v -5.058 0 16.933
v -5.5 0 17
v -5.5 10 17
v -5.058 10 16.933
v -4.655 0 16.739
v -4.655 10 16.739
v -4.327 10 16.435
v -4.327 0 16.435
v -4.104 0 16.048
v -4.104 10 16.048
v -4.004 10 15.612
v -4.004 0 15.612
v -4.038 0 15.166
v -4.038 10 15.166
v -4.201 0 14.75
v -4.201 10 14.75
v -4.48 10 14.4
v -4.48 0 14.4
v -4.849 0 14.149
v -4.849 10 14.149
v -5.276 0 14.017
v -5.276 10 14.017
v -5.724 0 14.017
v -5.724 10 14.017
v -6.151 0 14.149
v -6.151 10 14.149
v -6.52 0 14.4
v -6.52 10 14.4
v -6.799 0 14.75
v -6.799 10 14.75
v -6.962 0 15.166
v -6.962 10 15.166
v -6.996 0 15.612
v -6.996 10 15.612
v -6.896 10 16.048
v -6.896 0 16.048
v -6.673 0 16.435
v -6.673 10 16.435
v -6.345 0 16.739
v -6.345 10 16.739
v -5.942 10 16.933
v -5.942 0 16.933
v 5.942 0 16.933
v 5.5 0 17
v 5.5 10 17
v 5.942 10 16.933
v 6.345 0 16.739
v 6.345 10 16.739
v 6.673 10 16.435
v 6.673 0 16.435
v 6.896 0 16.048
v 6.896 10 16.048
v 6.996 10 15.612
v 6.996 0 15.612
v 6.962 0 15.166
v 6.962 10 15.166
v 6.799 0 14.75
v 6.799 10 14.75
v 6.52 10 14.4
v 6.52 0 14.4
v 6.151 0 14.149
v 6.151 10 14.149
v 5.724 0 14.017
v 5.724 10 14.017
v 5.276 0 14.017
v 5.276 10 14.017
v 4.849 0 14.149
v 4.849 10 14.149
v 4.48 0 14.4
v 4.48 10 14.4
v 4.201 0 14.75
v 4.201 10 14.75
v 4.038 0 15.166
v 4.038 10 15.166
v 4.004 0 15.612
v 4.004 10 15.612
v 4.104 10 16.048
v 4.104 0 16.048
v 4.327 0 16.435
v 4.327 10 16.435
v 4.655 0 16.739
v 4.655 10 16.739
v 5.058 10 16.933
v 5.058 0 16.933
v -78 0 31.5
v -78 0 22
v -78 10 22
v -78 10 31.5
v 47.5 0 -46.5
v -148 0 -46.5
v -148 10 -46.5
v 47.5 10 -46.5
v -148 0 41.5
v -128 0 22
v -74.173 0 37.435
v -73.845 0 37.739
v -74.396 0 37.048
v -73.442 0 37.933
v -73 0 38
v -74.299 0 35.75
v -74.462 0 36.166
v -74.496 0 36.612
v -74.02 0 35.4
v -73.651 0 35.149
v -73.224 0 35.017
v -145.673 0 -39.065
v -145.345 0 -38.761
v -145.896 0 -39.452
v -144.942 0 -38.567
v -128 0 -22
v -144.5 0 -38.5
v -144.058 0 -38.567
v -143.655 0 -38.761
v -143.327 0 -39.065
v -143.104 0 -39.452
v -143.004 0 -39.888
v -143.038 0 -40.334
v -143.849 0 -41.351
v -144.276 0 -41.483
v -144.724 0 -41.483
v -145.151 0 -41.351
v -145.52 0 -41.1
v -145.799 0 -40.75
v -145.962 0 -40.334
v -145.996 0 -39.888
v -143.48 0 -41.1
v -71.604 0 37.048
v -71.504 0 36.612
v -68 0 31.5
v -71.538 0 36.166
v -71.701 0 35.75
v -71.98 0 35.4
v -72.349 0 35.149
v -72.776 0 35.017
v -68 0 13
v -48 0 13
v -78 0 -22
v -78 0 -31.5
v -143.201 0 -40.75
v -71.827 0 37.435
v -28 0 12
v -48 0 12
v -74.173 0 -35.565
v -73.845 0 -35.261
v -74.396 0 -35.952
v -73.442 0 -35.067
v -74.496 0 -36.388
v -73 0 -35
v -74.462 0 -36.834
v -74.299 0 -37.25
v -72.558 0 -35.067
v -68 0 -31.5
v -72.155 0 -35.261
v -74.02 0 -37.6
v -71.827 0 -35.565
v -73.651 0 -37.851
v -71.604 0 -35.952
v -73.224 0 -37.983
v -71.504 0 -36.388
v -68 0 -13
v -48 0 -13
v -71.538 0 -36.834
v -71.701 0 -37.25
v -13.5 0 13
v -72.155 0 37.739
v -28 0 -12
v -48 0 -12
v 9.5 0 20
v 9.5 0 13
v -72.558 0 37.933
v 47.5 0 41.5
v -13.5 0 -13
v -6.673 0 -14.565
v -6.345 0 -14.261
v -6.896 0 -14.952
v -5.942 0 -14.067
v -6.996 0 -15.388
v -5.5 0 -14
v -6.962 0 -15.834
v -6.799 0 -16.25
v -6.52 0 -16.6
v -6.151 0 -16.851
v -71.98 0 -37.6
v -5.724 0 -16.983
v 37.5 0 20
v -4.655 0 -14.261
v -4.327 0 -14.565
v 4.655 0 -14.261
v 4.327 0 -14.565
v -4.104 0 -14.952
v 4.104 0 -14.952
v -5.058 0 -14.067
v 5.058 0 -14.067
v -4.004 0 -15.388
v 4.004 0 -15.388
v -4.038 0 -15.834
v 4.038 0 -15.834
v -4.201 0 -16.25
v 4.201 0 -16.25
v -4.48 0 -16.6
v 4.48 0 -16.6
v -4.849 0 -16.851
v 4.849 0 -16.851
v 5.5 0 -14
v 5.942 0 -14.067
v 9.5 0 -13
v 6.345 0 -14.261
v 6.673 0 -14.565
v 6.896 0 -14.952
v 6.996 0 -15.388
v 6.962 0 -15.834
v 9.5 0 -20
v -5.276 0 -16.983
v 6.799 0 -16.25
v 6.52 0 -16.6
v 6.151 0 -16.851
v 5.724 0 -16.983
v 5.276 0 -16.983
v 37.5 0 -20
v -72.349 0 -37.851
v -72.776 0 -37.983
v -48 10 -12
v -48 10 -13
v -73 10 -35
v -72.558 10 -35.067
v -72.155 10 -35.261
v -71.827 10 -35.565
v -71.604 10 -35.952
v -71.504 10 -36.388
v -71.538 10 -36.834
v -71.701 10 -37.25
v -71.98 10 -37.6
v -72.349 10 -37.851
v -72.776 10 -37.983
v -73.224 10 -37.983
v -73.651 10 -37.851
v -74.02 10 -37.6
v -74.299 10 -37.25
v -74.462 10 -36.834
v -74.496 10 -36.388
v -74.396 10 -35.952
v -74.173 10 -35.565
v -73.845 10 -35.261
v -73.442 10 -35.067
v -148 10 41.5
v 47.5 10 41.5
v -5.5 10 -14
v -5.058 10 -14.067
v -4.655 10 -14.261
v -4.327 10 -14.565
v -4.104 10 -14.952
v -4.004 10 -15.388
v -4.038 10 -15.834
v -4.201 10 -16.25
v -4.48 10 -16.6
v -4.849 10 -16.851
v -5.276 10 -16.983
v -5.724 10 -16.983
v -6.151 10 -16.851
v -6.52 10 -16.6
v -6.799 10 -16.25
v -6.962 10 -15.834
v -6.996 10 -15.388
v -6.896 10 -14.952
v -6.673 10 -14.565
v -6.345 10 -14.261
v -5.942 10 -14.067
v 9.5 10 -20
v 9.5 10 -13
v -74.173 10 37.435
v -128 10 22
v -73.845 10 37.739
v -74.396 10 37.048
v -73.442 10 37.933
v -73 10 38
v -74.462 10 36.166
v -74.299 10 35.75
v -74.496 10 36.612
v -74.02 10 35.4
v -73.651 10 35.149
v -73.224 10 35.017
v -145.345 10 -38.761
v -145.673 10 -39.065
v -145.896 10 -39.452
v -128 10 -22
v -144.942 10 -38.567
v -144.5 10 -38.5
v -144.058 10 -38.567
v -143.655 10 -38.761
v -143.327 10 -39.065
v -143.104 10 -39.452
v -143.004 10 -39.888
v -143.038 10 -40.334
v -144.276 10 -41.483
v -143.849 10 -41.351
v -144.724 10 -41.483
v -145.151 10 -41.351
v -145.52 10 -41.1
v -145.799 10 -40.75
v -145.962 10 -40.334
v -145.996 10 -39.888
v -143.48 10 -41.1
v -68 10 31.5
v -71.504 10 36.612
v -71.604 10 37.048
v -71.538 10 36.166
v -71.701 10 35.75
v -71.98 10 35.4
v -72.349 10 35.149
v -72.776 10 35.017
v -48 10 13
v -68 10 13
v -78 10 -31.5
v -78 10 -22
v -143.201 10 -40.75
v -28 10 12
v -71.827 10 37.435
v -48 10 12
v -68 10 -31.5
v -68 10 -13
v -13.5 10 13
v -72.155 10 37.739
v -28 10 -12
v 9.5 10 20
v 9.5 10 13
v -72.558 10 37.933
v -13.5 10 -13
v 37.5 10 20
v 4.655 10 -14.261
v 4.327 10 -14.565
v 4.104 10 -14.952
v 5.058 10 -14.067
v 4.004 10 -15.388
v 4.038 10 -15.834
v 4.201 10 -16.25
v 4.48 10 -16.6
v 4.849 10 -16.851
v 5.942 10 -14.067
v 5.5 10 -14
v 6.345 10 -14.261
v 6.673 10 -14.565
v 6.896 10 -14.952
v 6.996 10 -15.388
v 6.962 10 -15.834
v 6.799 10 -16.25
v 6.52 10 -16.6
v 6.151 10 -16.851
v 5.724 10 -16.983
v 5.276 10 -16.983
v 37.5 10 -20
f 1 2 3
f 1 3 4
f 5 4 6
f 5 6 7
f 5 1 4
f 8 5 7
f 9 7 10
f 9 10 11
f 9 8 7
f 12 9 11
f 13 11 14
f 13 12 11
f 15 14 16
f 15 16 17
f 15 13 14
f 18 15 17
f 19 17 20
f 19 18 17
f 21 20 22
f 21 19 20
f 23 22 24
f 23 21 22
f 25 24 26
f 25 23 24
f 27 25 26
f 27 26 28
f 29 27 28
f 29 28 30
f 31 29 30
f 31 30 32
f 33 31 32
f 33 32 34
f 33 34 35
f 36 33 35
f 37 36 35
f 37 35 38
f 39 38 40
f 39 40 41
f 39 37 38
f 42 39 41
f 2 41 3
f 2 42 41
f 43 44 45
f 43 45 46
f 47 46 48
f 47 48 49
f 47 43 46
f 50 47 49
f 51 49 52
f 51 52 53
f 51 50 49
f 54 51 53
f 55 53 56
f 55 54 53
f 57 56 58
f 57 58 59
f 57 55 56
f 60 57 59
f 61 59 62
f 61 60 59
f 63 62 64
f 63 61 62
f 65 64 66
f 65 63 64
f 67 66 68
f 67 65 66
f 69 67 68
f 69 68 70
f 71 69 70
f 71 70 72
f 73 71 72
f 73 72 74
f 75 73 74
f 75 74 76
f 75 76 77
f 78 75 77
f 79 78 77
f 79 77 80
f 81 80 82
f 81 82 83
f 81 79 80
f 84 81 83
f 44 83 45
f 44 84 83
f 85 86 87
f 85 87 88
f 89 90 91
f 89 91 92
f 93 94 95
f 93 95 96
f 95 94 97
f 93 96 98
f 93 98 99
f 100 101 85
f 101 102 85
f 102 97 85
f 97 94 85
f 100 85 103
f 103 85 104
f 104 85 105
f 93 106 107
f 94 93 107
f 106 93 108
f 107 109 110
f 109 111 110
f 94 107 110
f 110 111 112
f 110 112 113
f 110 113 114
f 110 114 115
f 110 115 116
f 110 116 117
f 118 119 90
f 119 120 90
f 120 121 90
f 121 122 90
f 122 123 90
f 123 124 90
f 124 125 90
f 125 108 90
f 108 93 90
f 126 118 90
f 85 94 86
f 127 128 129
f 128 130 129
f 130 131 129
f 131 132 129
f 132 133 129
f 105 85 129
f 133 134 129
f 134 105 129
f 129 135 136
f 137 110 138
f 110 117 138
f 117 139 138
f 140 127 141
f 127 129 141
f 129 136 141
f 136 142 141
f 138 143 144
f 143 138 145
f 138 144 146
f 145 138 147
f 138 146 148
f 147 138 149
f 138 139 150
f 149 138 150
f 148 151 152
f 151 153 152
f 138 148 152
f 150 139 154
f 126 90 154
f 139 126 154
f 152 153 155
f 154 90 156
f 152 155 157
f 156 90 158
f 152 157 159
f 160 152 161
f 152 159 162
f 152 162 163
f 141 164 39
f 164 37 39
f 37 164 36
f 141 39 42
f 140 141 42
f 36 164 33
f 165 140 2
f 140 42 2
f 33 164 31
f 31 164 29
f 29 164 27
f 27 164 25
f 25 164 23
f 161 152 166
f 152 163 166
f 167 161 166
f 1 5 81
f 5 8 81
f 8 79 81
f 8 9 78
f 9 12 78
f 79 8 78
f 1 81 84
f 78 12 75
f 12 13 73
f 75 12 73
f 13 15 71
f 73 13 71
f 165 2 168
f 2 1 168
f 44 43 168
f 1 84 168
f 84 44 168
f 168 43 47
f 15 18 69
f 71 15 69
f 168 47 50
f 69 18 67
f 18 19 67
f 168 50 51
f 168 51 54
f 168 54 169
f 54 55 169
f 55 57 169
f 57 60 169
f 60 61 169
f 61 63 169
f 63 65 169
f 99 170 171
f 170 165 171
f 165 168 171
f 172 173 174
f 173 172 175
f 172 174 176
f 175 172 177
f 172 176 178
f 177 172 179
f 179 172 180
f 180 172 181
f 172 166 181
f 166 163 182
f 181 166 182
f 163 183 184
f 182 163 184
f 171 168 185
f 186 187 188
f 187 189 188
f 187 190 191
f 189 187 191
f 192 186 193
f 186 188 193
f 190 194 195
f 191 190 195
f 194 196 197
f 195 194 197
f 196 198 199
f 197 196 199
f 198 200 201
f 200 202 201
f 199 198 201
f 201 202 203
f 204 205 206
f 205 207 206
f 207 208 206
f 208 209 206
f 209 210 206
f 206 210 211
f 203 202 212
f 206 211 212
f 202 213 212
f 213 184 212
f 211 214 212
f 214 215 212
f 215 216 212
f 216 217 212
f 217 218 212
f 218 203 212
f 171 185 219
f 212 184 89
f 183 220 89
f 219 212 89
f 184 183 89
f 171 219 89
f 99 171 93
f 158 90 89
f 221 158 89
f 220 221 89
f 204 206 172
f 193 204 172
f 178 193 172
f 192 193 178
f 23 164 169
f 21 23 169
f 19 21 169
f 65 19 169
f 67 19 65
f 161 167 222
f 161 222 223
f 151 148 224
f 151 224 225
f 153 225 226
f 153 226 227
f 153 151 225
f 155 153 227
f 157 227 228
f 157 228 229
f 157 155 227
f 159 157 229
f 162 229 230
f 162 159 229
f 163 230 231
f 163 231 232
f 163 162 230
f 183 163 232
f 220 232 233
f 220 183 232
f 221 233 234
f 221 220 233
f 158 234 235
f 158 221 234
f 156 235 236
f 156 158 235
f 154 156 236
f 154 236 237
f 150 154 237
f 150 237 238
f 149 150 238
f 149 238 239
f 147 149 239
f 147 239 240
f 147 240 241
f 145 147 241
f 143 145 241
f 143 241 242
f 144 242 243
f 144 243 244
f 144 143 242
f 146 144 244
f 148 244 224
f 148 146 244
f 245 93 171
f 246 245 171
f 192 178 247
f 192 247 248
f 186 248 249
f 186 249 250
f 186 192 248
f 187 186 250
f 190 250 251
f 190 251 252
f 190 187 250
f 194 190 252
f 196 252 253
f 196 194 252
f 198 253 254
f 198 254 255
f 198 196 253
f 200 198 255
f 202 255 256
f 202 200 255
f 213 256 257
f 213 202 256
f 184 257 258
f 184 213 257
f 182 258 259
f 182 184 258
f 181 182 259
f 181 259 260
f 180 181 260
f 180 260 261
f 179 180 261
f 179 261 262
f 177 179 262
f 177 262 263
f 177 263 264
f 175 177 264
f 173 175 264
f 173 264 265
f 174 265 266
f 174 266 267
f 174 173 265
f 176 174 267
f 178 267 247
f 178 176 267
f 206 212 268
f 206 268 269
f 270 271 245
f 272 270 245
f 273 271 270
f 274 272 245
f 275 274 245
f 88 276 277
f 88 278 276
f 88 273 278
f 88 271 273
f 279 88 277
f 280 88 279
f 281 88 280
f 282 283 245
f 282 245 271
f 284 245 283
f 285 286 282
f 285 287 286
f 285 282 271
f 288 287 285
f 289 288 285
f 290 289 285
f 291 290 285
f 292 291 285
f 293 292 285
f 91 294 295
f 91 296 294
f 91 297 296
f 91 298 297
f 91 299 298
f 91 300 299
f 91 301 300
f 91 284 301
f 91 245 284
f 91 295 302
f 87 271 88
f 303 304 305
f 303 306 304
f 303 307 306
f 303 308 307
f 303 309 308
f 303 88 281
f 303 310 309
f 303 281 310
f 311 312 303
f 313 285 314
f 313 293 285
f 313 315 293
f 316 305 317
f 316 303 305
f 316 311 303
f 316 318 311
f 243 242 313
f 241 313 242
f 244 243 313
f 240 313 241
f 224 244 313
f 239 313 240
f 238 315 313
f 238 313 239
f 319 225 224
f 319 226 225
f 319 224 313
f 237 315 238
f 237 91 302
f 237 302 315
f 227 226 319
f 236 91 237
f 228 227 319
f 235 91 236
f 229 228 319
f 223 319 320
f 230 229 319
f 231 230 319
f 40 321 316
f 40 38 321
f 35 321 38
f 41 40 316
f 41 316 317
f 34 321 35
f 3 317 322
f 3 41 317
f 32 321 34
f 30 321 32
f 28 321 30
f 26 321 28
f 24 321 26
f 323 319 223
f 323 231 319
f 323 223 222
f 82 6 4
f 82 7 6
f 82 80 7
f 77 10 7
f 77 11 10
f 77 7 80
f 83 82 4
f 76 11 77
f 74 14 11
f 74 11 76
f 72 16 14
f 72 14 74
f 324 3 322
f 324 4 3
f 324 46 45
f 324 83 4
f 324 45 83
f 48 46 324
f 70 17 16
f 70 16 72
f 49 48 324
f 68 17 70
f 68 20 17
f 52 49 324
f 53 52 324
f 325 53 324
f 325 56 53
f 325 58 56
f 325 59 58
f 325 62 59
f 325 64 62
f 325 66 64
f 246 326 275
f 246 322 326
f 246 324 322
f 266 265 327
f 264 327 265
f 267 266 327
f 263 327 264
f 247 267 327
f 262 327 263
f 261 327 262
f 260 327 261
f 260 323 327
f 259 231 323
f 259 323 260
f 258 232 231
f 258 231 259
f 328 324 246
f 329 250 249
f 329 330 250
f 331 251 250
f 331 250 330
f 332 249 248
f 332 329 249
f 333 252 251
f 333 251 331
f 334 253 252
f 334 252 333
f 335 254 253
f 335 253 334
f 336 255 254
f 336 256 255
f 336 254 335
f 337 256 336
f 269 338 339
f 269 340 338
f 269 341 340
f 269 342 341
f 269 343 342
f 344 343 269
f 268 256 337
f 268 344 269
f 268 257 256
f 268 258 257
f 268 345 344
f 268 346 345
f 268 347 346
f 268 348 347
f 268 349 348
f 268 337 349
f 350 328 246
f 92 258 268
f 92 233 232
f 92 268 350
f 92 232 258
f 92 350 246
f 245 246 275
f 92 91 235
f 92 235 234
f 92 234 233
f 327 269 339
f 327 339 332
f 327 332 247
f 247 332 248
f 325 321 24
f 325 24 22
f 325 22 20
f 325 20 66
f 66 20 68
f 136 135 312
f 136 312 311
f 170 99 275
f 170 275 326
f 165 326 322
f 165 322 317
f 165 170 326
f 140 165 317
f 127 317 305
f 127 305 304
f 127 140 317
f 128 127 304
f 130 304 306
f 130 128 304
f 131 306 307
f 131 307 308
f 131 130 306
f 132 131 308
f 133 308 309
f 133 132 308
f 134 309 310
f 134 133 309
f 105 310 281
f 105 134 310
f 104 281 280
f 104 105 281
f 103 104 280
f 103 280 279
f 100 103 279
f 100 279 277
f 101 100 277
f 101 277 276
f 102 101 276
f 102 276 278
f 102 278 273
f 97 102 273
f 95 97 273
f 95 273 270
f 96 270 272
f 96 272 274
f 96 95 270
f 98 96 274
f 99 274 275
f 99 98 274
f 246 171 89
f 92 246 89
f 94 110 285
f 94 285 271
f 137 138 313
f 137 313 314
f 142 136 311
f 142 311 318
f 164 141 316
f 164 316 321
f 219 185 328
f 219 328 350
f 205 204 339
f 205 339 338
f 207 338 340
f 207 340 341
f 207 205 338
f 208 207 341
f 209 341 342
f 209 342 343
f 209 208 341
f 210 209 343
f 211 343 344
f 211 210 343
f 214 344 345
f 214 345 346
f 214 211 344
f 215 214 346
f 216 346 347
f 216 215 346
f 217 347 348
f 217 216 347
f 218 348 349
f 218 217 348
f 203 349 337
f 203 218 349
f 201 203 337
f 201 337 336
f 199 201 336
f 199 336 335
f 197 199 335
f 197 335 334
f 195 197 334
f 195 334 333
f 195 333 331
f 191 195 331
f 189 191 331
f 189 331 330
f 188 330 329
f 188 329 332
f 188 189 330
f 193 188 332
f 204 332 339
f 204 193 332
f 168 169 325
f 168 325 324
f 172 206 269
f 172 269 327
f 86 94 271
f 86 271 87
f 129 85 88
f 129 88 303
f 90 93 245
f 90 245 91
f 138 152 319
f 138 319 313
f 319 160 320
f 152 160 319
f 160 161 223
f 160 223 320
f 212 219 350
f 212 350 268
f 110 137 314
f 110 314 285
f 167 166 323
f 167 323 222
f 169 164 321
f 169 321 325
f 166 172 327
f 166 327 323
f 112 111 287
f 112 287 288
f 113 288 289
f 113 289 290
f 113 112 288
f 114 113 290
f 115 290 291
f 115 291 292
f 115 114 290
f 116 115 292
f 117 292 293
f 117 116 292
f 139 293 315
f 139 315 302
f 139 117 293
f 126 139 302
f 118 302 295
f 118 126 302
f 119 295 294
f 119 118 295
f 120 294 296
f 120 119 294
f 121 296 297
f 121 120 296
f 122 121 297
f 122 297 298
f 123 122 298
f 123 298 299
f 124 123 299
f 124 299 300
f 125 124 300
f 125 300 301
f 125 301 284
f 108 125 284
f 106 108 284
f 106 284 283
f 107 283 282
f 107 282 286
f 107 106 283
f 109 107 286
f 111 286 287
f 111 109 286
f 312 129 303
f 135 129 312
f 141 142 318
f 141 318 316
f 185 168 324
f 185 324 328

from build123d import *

# Parameters (mm, degrees)
SKETCH_1_W      = 195.5
SKETCH_1_H      = 88
SKETCH_1_R      = 1.5
EXTRUDE_1_DEPTH = 10


with BuildPart() as part:
    # Эскиз1 → Бобышка-Вытянуть1 (new body)
    with BuildSketch(Plane(origin=(0, 0, 0), x_dir=(1, 0, 0), z_dir=(0, 1, 0))):
        with Locations((-50.25, 2.5)):
            Rectangle(SKETCH_1_W, SKETCH_1_H)
        with Locations(Location((-5.5, 15.5, 0), (0, 0, 270))):
            Circle(SKETCH_1_R, mode=Mode.SUBTRACT)
        with Locations(Location((5.5, 15.5, 0), (0, 0, 270))):
            Circle(SKETCH_1_R, mode=Mode.SUBTRACT)
        with Locations(Location((-5.5, -15.5, 0), (0, 0, 270))):
            Circle(SKETCH_1_R, mode=Mode.SUBTRACT)
        with Locations(Location((5.5, -15.5, 0), (0, 0, 270))):
            Circle(SKETCH_1_R, mode=Mode.SUBTRACT)
        with Locations(Location((-73, 36.5, 0), (0, 0, 270))):
            Circle(SKETCH_1_R, mode=Mode.SUBTRACT)
        with Locations(Location((-73, -36.5, 0), (0, 0, 270))):
            Circle(SKETCH_1_R, mode=Mode.SUBTRACT)
        with Locations(Location((-144.5, 40, 0), (0, 0, 270))):
            Circle(SKETCH_1_R, mode=Mode.SUBTRACT)
        Polygon((-13.5, 13), (-28, 12), (-48, 12), (-48, 13), (-68, 13), (-68, 31.5), (-78, 31.5), (-78, 22), (-128, 22), (-128, -22), (-78, -22), (-78, -31.5), (-68, -31.5), (-68, -13), (-48, -13), (-48, -12), (-28, -12), (-13.5, -13), (9.5, -13), (9.5, -20), (37.5, -20), (37.5, 20), (9.5, 20), (9.5, 13), align=None, mode=Mode.SUBTRACT)
    extrude(amount=EXTRUDE_1_DEPTH)


solid = part.part
